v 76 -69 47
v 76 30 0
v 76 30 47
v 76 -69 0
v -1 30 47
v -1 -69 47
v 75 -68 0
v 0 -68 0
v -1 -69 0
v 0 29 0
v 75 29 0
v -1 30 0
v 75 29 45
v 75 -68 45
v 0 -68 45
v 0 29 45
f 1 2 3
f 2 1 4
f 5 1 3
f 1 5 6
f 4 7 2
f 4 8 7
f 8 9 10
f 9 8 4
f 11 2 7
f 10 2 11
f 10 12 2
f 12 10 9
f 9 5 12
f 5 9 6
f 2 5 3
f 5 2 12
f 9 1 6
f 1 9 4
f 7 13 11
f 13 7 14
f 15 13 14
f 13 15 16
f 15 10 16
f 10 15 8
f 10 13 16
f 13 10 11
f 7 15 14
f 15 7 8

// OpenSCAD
difference(){
	union(){
        
        translate([-1,-69,0]){
            cube([77,99,47], center=false);
        }        


        
    //    include <oppakker.scad>;  
    }{
        translate([0,-68,-1]){
            cube([75,97,46], center=false);
        }        
    }
}
